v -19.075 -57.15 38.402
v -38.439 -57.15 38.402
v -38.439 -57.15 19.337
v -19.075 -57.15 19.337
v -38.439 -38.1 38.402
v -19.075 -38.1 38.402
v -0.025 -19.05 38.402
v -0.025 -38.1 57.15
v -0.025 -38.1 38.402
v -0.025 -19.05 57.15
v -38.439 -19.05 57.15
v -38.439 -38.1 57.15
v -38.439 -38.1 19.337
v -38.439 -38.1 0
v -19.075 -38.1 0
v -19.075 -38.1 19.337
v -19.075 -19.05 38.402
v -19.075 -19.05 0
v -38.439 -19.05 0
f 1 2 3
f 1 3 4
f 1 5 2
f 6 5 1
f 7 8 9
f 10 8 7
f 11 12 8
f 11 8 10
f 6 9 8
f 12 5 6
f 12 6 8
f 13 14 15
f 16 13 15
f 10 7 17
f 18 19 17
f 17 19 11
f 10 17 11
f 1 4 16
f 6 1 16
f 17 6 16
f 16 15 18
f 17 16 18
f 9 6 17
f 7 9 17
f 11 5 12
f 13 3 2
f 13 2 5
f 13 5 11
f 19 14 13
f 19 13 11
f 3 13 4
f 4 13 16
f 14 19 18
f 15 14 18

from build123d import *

# Parameters (mm, degrees)
F0_W     = 19.36434
F0_H     = 19.05
F1_DEPTH = 57.15
F2_W     = 19.36434
F2_H     = 19.065039
F3_DEPTH = 19.05
F4_W     = 19.05
F4_H     = 18.74761
F5_DEPTH = 19.05


with BuildPart() as f1:
    # F0 (on Top) → F1 (new body)
    with BuildSketch(Plane.XY):
        with Locations((-28.756759, -28.575)):
            Rectangle(F0_W, F0_H)
    extrude(amount=F1_DEPTH)

    # F2 (on face) → F3 (join)
    with BuildSketch(Plane.XZ.offset(38.1)):
        with Locations((-28.756759, 28.86987)):
            Rectangle(F2_W, F2_H)
    extrude(amount=F3_DEPTH)

    # F4 (on face) → F5 (join)
    with BuildSketch(Plane.YZ.offset(-19.074589)):
        with Locations((-28.575, 47.776195)):
            Rectangle(F4_W, F4_H)
    extrude(amount=F5_DEPTH)


solid = f1.part
